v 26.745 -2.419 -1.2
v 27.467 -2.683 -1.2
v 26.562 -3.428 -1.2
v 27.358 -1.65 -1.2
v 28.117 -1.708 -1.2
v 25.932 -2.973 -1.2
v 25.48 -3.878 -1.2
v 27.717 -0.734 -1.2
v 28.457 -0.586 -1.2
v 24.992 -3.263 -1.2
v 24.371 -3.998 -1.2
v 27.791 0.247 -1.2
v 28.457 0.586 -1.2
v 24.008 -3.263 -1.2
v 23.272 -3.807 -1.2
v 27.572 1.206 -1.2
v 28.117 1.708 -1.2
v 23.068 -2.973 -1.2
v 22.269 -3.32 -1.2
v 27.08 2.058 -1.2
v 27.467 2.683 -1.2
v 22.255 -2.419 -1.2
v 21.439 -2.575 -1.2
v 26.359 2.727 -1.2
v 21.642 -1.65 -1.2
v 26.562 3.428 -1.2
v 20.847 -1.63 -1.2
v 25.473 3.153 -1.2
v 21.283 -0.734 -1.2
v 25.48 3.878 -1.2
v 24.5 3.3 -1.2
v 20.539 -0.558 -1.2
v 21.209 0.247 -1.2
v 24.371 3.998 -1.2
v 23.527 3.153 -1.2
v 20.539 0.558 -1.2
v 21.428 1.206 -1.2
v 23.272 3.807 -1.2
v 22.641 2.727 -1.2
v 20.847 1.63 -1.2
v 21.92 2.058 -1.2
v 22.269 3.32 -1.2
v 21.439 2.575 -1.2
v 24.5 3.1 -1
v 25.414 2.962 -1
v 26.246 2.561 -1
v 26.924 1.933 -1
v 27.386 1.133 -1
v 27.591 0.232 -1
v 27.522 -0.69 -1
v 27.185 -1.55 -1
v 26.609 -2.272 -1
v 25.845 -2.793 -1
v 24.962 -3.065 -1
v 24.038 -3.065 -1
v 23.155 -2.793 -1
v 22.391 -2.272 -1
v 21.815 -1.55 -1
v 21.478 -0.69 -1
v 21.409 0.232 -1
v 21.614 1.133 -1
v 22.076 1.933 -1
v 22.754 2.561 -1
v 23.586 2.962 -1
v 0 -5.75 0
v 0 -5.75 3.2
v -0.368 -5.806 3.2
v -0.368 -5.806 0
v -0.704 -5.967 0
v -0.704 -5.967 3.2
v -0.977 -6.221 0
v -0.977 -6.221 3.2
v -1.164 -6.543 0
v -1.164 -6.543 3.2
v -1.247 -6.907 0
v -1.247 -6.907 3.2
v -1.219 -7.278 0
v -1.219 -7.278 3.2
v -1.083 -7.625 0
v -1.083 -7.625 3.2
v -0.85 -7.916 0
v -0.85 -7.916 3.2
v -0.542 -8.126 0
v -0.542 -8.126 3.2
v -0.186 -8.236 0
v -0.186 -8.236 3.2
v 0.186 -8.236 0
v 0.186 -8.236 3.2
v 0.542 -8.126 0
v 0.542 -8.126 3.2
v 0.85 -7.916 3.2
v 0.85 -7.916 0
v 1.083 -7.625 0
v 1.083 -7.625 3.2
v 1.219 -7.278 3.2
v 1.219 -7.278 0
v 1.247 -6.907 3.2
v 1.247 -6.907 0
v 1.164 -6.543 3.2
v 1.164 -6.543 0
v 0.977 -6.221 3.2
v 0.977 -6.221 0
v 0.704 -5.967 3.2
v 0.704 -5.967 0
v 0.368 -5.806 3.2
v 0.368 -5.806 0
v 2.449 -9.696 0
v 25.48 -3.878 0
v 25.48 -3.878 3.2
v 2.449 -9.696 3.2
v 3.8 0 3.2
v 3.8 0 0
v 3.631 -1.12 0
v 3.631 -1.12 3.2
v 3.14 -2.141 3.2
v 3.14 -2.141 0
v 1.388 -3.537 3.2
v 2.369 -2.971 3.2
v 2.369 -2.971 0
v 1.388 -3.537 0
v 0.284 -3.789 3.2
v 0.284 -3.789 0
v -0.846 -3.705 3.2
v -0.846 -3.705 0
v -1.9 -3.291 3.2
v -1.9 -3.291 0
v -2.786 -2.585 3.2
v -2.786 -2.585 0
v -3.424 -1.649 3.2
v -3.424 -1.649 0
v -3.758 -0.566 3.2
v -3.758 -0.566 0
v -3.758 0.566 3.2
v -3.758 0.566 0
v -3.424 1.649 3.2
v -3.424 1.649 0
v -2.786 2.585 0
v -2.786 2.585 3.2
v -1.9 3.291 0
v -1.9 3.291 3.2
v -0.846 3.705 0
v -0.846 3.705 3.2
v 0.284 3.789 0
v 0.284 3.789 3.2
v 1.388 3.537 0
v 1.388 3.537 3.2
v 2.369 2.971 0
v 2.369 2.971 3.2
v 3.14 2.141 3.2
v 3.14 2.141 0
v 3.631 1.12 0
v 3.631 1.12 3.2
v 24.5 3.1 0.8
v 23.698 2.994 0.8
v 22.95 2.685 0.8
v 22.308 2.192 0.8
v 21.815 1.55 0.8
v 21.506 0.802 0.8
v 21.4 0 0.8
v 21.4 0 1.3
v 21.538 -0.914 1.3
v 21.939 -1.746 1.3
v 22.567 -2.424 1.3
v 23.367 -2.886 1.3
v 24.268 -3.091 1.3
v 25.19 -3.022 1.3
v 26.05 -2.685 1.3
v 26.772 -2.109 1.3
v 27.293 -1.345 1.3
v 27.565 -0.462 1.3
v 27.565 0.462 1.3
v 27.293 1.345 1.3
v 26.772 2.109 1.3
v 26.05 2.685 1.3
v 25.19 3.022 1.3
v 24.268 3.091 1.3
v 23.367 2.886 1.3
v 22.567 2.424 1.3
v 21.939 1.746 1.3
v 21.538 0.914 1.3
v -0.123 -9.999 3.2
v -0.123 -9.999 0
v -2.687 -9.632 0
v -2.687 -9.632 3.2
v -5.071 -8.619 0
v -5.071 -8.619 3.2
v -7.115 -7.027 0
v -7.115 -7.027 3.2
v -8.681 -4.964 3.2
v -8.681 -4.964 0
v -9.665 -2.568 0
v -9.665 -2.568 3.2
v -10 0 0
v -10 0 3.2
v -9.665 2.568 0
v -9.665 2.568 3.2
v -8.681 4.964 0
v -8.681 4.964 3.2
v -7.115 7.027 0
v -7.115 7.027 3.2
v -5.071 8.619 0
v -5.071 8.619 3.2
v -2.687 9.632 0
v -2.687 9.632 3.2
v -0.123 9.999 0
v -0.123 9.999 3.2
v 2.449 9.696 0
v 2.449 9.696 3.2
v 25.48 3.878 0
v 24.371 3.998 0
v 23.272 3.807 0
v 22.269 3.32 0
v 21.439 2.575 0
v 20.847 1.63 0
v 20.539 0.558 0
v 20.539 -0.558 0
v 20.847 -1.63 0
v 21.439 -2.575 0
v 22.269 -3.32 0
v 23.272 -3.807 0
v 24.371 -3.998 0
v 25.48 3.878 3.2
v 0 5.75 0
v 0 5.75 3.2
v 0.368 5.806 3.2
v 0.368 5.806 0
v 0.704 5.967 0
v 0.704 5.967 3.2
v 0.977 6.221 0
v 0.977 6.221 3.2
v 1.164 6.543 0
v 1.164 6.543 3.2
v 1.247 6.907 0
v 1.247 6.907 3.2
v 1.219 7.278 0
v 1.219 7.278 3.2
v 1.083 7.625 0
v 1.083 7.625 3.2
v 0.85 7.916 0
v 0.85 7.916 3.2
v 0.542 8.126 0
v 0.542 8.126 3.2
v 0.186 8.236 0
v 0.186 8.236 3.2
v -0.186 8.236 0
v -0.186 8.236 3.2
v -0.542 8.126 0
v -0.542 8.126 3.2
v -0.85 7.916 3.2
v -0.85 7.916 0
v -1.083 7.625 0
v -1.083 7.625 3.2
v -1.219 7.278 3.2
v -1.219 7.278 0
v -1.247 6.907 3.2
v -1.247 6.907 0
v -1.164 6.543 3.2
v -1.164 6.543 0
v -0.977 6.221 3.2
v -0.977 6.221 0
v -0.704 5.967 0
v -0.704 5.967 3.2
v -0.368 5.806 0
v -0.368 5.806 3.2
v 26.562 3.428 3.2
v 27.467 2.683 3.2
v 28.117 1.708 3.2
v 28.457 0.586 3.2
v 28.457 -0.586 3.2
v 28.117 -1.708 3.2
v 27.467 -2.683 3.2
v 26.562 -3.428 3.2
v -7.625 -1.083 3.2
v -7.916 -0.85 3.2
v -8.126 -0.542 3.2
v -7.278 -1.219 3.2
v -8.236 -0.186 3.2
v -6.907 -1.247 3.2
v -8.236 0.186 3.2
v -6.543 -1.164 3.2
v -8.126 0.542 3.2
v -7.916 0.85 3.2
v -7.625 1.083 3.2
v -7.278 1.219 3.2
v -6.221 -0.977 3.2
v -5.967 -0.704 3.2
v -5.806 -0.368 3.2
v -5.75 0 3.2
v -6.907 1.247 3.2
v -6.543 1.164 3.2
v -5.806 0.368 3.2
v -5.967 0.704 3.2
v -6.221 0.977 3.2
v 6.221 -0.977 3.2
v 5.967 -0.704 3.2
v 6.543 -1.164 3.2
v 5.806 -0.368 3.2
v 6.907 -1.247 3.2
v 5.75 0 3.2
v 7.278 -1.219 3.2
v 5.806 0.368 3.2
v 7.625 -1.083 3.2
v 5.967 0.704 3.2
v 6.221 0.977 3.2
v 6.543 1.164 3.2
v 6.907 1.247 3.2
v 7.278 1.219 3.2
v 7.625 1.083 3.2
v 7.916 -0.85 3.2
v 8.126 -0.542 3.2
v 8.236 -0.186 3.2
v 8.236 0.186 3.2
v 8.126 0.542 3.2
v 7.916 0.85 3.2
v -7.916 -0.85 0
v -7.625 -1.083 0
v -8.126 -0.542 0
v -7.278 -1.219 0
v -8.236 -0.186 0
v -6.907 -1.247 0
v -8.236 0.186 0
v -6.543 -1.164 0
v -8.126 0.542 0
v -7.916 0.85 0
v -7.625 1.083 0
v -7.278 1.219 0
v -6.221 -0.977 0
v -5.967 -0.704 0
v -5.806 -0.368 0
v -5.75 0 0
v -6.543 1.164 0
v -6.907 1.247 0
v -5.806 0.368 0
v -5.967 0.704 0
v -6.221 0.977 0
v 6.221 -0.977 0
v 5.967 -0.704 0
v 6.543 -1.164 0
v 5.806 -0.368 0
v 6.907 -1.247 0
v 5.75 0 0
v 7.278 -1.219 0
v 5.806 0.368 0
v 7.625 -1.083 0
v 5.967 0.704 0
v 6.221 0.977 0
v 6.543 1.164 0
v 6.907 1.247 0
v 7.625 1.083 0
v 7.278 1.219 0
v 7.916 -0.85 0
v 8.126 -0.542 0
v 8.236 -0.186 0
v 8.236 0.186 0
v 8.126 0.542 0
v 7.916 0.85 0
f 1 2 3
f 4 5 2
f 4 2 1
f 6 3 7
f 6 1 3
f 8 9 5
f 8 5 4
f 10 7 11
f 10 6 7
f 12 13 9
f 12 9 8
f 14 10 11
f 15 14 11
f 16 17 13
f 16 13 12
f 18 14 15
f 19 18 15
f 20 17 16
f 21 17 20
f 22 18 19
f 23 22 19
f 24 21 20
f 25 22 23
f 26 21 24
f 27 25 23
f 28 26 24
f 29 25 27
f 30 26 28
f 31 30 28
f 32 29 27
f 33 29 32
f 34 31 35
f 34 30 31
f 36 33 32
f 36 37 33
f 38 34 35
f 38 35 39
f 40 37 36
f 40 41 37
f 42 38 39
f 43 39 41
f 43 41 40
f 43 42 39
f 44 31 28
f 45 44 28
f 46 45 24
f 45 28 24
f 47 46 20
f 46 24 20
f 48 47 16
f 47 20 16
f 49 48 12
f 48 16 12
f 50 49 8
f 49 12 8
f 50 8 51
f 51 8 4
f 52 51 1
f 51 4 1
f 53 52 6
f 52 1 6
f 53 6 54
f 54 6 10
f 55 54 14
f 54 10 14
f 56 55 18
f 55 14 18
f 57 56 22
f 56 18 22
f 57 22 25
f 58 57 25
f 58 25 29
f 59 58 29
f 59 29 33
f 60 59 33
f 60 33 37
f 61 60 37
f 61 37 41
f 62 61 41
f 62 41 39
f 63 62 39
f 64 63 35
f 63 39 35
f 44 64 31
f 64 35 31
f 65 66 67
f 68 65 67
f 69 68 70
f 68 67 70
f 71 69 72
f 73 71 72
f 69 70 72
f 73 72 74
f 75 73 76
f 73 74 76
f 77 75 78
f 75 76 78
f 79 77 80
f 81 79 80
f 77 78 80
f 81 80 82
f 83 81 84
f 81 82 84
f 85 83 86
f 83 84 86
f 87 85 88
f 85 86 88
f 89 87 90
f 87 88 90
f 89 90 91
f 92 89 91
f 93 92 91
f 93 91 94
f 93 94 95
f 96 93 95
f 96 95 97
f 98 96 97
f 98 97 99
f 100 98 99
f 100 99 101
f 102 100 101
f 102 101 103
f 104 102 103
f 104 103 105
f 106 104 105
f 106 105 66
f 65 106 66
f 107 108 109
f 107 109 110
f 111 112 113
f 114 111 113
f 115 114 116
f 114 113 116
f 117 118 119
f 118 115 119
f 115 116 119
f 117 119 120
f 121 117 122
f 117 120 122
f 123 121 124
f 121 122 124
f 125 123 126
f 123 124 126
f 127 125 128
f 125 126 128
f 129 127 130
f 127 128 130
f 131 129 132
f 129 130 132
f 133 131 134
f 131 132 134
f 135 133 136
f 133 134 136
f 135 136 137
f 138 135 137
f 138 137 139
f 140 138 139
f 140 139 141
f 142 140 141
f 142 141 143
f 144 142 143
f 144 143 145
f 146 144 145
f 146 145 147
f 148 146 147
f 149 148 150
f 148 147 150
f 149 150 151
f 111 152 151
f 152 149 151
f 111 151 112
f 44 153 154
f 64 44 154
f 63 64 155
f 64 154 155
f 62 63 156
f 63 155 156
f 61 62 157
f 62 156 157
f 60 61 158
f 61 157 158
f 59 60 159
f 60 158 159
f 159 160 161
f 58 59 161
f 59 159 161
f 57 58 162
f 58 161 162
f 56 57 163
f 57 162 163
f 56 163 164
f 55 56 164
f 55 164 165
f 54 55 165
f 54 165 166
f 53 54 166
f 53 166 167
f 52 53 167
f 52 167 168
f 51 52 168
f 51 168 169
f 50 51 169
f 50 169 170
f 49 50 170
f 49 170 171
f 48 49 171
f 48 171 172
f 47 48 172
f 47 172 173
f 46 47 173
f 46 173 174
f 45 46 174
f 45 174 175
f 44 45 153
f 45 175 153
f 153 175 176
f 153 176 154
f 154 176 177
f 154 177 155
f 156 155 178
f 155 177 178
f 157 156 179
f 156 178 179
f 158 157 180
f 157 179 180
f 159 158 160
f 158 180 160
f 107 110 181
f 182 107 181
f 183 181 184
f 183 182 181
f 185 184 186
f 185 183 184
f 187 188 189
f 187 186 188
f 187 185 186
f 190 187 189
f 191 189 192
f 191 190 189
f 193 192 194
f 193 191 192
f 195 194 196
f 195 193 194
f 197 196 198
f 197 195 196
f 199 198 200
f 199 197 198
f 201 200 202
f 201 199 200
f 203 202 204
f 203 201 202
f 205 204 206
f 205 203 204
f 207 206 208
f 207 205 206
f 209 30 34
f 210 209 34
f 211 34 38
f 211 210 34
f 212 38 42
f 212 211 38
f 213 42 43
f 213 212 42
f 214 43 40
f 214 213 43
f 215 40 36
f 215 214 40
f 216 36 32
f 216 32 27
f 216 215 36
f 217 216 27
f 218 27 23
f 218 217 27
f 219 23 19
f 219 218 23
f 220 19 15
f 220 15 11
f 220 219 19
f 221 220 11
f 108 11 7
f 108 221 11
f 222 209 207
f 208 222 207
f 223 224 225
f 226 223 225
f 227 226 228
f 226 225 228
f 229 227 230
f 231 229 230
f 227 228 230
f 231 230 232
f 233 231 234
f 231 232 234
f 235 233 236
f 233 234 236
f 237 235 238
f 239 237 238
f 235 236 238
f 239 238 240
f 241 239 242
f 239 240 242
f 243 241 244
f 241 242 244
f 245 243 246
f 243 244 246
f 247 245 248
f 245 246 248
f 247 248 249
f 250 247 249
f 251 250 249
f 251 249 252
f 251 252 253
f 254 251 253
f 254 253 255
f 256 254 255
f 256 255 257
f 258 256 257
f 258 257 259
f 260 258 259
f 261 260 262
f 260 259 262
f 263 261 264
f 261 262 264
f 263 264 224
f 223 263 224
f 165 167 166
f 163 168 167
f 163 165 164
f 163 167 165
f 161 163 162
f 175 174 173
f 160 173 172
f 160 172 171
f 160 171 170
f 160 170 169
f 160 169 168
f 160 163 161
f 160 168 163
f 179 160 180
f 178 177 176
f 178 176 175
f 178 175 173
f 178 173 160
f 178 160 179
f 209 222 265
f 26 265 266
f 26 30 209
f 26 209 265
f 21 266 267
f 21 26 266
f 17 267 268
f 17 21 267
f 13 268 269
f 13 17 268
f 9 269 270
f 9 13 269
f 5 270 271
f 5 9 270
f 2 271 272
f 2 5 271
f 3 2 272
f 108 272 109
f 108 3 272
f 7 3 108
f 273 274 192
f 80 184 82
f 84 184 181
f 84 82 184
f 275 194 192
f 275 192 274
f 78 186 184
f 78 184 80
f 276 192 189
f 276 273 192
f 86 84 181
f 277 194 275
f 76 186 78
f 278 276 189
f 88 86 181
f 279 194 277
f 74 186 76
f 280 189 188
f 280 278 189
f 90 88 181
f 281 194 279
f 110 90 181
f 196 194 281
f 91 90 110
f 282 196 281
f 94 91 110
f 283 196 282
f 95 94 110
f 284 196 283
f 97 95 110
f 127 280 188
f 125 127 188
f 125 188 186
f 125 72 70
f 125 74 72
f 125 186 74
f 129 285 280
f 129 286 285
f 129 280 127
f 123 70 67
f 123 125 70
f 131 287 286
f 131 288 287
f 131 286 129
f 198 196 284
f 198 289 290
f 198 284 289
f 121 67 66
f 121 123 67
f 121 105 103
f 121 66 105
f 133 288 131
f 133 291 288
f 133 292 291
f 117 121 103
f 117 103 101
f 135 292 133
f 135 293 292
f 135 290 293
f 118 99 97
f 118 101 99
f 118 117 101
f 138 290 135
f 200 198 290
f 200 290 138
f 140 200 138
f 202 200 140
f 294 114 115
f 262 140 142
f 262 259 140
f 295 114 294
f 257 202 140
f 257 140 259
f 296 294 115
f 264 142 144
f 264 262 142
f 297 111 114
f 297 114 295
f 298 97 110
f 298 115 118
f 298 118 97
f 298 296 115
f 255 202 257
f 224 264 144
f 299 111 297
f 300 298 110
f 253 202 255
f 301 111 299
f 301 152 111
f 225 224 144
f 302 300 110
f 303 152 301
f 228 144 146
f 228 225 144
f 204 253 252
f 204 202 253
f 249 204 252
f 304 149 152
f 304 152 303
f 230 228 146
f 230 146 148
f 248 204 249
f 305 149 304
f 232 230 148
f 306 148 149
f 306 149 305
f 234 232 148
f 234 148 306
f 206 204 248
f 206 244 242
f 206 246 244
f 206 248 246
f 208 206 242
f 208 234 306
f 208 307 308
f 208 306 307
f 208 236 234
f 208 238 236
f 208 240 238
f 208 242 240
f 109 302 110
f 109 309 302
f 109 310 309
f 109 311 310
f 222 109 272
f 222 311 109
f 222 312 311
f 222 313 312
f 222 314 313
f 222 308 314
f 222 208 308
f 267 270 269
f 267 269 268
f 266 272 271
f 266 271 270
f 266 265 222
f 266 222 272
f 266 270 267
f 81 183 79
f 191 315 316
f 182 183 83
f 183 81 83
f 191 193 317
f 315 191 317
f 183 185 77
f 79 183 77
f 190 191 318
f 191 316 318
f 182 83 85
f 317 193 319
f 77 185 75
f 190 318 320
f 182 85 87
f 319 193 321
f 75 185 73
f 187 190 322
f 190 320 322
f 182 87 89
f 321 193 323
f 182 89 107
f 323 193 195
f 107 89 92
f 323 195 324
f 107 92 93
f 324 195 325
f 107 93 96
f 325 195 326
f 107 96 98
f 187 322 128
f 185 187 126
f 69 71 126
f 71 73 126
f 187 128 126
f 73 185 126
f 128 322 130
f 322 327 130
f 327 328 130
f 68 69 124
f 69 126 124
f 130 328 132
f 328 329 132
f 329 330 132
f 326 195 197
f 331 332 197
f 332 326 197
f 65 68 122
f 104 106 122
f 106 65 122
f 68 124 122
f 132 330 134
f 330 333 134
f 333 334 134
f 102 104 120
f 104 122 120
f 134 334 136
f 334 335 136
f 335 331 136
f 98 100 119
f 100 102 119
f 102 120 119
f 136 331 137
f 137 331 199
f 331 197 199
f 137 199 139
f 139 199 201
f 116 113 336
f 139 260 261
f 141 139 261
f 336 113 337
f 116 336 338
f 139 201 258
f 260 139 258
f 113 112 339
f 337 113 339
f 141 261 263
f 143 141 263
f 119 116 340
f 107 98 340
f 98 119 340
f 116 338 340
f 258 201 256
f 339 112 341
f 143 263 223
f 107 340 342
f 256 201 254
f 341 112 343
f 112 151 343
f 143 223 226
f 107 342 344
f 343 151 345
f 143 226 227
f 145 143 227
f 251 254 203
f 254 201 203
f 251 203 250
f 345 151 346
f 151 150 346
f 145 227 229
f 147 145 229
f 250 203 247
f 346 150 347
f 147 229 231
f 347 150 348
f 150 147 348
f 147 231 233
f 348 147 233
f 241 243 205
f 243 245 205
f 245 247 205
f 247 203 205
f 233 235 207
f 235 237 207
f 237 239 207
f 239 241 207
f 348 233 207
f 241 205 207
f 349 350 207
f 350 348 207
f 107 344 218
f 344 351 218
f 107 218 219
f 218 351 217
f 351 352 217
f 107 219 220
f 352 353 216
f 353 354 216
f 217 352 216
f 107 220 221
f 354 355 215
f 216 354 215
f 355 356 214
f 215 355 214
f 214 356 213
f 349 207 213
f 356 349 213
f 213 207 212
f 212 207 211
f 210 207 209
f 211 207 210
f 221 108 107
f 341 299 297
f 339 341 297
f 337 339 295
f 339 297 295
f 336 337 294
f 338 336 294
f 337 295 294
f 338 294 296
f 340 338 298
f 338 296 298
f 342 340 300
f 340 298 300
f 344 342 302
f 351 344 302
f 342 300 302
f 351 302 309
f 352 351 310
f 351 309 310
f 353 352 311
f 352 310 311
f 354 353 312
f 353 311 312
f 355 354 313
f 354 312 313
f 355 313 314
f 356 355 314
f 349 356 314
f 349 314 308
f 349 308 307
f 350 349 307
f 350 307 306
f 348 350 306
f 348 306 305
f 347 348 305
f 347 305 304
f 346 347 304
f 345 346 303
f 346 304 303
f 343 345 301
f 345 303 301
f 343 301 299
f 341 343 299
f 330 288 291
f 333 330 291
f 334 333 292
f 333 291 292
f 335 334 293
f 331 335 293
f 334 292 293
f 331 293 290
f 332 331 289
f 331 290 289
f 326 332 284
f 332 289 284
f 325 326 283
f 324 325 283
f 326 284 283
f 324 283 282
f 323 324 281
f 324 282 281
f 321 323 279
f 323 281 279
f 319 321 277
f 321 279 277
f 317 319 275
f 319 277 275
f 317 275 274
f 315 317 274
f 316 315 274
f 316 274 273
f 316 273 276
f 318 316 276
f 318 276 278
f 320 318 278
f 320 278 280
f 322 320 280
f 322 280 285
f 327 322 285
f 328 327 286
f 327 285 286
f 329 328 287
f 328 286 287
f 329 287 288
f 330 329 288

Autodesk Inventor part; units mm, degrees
ref_plane "YZ Plane" through (0, 0, 0) normal (1, 0, 0) x (0, 1, 0)
ref_plane "XZ Plane" through (0, 0, 0) normal (0, 1, 0) x (-1, 0, 0)
ref_plane "XY Plane" through (0, 0, 0) normal (0, 0, 1) x (1, 0, 0)
sketch "Skizze1" plane through (0, 0, 0) normal (0, 0, 1) x (1, 0, 0)
  arc A0 (2.449, 9.6955) -> (2.449, -9.6955) centre (0, 0) ccw
  arc A1 (25.4796, -3.8782) -> (25.4796, 3.8782) centre (24.5, 0) ccw
  line L0 (25.4796, 3.8782) -> (2.449, 9.6955)
  line L1 (25.4796, -3.8782) -> (2.449, -9.6955)
  circle A2 centre (0, 0) radius 3.8
  dimension "d0" = 20
  dimension "d1" = 8
  dimension "d2" = 24.5
  dimension "d40" = 7.6
extrude "Extrusion1" add sketch "Skizze1" along normal blind 3.2
sketch "Skizze2" plane through (0, 0, 0) normal (0, 0, -1) x (-1, 0, 0)
  arc A0 (-25.4796, 3.8782) -> (-25.4796, -3.8782) centre (-24.5, 0) ccw projected
  circle A1 centre (-24.5, 0) radius 4
  point P0 (0, 0)
  point P1 (-25.4796, 3.8782)
extrude "Extrusion2" add sketch "Skizze2" along normal blind 1.2
sketch "Skizze3" plane through (24.5, 0, -1.2) normal (0, 0, -1) x (-1, 0, 0)
  circle A0 centre (0, 0) radius 4 projected
  point P0 (24.5, 0)
hole "Bohrung1" at (24.5, 0, -1.2) direction (0, 0, 1) diameter 6.2 depth 2
sketch "Skizze4" plane through (0, 0, 0) normal (0, 0, -1) x (-1, 0, 0)
  point P0 (0, 0)
  point P1 (0, -7)
  dimension "d14" = 7
hole "Bohrung2" at (0, -7, 0) direction (0, 0, 1) diameter 2.5 end through all
pattern_circular "Runde Anordnung1" count 4 over 360 about axis through (0, 0, 0) along (0, 0, 1) of "Bohrung2"
chamfer "Fasen4" distance 0.2 angle 45 1 edges at (24.5, -3.1, -1.2)
sketch "Skizze5" plane through (24.5, 0, 0.8) normal (0, 0, -1) x (-1, 0, 0)
  circle A0 centre (0, 0) radius 3.1 projected
  point P0 (24.5, 0)
extrude "Extrusion3" cut sketch "Skizze5" against normal blind 0.5
properties part number "Magnet-arm"
